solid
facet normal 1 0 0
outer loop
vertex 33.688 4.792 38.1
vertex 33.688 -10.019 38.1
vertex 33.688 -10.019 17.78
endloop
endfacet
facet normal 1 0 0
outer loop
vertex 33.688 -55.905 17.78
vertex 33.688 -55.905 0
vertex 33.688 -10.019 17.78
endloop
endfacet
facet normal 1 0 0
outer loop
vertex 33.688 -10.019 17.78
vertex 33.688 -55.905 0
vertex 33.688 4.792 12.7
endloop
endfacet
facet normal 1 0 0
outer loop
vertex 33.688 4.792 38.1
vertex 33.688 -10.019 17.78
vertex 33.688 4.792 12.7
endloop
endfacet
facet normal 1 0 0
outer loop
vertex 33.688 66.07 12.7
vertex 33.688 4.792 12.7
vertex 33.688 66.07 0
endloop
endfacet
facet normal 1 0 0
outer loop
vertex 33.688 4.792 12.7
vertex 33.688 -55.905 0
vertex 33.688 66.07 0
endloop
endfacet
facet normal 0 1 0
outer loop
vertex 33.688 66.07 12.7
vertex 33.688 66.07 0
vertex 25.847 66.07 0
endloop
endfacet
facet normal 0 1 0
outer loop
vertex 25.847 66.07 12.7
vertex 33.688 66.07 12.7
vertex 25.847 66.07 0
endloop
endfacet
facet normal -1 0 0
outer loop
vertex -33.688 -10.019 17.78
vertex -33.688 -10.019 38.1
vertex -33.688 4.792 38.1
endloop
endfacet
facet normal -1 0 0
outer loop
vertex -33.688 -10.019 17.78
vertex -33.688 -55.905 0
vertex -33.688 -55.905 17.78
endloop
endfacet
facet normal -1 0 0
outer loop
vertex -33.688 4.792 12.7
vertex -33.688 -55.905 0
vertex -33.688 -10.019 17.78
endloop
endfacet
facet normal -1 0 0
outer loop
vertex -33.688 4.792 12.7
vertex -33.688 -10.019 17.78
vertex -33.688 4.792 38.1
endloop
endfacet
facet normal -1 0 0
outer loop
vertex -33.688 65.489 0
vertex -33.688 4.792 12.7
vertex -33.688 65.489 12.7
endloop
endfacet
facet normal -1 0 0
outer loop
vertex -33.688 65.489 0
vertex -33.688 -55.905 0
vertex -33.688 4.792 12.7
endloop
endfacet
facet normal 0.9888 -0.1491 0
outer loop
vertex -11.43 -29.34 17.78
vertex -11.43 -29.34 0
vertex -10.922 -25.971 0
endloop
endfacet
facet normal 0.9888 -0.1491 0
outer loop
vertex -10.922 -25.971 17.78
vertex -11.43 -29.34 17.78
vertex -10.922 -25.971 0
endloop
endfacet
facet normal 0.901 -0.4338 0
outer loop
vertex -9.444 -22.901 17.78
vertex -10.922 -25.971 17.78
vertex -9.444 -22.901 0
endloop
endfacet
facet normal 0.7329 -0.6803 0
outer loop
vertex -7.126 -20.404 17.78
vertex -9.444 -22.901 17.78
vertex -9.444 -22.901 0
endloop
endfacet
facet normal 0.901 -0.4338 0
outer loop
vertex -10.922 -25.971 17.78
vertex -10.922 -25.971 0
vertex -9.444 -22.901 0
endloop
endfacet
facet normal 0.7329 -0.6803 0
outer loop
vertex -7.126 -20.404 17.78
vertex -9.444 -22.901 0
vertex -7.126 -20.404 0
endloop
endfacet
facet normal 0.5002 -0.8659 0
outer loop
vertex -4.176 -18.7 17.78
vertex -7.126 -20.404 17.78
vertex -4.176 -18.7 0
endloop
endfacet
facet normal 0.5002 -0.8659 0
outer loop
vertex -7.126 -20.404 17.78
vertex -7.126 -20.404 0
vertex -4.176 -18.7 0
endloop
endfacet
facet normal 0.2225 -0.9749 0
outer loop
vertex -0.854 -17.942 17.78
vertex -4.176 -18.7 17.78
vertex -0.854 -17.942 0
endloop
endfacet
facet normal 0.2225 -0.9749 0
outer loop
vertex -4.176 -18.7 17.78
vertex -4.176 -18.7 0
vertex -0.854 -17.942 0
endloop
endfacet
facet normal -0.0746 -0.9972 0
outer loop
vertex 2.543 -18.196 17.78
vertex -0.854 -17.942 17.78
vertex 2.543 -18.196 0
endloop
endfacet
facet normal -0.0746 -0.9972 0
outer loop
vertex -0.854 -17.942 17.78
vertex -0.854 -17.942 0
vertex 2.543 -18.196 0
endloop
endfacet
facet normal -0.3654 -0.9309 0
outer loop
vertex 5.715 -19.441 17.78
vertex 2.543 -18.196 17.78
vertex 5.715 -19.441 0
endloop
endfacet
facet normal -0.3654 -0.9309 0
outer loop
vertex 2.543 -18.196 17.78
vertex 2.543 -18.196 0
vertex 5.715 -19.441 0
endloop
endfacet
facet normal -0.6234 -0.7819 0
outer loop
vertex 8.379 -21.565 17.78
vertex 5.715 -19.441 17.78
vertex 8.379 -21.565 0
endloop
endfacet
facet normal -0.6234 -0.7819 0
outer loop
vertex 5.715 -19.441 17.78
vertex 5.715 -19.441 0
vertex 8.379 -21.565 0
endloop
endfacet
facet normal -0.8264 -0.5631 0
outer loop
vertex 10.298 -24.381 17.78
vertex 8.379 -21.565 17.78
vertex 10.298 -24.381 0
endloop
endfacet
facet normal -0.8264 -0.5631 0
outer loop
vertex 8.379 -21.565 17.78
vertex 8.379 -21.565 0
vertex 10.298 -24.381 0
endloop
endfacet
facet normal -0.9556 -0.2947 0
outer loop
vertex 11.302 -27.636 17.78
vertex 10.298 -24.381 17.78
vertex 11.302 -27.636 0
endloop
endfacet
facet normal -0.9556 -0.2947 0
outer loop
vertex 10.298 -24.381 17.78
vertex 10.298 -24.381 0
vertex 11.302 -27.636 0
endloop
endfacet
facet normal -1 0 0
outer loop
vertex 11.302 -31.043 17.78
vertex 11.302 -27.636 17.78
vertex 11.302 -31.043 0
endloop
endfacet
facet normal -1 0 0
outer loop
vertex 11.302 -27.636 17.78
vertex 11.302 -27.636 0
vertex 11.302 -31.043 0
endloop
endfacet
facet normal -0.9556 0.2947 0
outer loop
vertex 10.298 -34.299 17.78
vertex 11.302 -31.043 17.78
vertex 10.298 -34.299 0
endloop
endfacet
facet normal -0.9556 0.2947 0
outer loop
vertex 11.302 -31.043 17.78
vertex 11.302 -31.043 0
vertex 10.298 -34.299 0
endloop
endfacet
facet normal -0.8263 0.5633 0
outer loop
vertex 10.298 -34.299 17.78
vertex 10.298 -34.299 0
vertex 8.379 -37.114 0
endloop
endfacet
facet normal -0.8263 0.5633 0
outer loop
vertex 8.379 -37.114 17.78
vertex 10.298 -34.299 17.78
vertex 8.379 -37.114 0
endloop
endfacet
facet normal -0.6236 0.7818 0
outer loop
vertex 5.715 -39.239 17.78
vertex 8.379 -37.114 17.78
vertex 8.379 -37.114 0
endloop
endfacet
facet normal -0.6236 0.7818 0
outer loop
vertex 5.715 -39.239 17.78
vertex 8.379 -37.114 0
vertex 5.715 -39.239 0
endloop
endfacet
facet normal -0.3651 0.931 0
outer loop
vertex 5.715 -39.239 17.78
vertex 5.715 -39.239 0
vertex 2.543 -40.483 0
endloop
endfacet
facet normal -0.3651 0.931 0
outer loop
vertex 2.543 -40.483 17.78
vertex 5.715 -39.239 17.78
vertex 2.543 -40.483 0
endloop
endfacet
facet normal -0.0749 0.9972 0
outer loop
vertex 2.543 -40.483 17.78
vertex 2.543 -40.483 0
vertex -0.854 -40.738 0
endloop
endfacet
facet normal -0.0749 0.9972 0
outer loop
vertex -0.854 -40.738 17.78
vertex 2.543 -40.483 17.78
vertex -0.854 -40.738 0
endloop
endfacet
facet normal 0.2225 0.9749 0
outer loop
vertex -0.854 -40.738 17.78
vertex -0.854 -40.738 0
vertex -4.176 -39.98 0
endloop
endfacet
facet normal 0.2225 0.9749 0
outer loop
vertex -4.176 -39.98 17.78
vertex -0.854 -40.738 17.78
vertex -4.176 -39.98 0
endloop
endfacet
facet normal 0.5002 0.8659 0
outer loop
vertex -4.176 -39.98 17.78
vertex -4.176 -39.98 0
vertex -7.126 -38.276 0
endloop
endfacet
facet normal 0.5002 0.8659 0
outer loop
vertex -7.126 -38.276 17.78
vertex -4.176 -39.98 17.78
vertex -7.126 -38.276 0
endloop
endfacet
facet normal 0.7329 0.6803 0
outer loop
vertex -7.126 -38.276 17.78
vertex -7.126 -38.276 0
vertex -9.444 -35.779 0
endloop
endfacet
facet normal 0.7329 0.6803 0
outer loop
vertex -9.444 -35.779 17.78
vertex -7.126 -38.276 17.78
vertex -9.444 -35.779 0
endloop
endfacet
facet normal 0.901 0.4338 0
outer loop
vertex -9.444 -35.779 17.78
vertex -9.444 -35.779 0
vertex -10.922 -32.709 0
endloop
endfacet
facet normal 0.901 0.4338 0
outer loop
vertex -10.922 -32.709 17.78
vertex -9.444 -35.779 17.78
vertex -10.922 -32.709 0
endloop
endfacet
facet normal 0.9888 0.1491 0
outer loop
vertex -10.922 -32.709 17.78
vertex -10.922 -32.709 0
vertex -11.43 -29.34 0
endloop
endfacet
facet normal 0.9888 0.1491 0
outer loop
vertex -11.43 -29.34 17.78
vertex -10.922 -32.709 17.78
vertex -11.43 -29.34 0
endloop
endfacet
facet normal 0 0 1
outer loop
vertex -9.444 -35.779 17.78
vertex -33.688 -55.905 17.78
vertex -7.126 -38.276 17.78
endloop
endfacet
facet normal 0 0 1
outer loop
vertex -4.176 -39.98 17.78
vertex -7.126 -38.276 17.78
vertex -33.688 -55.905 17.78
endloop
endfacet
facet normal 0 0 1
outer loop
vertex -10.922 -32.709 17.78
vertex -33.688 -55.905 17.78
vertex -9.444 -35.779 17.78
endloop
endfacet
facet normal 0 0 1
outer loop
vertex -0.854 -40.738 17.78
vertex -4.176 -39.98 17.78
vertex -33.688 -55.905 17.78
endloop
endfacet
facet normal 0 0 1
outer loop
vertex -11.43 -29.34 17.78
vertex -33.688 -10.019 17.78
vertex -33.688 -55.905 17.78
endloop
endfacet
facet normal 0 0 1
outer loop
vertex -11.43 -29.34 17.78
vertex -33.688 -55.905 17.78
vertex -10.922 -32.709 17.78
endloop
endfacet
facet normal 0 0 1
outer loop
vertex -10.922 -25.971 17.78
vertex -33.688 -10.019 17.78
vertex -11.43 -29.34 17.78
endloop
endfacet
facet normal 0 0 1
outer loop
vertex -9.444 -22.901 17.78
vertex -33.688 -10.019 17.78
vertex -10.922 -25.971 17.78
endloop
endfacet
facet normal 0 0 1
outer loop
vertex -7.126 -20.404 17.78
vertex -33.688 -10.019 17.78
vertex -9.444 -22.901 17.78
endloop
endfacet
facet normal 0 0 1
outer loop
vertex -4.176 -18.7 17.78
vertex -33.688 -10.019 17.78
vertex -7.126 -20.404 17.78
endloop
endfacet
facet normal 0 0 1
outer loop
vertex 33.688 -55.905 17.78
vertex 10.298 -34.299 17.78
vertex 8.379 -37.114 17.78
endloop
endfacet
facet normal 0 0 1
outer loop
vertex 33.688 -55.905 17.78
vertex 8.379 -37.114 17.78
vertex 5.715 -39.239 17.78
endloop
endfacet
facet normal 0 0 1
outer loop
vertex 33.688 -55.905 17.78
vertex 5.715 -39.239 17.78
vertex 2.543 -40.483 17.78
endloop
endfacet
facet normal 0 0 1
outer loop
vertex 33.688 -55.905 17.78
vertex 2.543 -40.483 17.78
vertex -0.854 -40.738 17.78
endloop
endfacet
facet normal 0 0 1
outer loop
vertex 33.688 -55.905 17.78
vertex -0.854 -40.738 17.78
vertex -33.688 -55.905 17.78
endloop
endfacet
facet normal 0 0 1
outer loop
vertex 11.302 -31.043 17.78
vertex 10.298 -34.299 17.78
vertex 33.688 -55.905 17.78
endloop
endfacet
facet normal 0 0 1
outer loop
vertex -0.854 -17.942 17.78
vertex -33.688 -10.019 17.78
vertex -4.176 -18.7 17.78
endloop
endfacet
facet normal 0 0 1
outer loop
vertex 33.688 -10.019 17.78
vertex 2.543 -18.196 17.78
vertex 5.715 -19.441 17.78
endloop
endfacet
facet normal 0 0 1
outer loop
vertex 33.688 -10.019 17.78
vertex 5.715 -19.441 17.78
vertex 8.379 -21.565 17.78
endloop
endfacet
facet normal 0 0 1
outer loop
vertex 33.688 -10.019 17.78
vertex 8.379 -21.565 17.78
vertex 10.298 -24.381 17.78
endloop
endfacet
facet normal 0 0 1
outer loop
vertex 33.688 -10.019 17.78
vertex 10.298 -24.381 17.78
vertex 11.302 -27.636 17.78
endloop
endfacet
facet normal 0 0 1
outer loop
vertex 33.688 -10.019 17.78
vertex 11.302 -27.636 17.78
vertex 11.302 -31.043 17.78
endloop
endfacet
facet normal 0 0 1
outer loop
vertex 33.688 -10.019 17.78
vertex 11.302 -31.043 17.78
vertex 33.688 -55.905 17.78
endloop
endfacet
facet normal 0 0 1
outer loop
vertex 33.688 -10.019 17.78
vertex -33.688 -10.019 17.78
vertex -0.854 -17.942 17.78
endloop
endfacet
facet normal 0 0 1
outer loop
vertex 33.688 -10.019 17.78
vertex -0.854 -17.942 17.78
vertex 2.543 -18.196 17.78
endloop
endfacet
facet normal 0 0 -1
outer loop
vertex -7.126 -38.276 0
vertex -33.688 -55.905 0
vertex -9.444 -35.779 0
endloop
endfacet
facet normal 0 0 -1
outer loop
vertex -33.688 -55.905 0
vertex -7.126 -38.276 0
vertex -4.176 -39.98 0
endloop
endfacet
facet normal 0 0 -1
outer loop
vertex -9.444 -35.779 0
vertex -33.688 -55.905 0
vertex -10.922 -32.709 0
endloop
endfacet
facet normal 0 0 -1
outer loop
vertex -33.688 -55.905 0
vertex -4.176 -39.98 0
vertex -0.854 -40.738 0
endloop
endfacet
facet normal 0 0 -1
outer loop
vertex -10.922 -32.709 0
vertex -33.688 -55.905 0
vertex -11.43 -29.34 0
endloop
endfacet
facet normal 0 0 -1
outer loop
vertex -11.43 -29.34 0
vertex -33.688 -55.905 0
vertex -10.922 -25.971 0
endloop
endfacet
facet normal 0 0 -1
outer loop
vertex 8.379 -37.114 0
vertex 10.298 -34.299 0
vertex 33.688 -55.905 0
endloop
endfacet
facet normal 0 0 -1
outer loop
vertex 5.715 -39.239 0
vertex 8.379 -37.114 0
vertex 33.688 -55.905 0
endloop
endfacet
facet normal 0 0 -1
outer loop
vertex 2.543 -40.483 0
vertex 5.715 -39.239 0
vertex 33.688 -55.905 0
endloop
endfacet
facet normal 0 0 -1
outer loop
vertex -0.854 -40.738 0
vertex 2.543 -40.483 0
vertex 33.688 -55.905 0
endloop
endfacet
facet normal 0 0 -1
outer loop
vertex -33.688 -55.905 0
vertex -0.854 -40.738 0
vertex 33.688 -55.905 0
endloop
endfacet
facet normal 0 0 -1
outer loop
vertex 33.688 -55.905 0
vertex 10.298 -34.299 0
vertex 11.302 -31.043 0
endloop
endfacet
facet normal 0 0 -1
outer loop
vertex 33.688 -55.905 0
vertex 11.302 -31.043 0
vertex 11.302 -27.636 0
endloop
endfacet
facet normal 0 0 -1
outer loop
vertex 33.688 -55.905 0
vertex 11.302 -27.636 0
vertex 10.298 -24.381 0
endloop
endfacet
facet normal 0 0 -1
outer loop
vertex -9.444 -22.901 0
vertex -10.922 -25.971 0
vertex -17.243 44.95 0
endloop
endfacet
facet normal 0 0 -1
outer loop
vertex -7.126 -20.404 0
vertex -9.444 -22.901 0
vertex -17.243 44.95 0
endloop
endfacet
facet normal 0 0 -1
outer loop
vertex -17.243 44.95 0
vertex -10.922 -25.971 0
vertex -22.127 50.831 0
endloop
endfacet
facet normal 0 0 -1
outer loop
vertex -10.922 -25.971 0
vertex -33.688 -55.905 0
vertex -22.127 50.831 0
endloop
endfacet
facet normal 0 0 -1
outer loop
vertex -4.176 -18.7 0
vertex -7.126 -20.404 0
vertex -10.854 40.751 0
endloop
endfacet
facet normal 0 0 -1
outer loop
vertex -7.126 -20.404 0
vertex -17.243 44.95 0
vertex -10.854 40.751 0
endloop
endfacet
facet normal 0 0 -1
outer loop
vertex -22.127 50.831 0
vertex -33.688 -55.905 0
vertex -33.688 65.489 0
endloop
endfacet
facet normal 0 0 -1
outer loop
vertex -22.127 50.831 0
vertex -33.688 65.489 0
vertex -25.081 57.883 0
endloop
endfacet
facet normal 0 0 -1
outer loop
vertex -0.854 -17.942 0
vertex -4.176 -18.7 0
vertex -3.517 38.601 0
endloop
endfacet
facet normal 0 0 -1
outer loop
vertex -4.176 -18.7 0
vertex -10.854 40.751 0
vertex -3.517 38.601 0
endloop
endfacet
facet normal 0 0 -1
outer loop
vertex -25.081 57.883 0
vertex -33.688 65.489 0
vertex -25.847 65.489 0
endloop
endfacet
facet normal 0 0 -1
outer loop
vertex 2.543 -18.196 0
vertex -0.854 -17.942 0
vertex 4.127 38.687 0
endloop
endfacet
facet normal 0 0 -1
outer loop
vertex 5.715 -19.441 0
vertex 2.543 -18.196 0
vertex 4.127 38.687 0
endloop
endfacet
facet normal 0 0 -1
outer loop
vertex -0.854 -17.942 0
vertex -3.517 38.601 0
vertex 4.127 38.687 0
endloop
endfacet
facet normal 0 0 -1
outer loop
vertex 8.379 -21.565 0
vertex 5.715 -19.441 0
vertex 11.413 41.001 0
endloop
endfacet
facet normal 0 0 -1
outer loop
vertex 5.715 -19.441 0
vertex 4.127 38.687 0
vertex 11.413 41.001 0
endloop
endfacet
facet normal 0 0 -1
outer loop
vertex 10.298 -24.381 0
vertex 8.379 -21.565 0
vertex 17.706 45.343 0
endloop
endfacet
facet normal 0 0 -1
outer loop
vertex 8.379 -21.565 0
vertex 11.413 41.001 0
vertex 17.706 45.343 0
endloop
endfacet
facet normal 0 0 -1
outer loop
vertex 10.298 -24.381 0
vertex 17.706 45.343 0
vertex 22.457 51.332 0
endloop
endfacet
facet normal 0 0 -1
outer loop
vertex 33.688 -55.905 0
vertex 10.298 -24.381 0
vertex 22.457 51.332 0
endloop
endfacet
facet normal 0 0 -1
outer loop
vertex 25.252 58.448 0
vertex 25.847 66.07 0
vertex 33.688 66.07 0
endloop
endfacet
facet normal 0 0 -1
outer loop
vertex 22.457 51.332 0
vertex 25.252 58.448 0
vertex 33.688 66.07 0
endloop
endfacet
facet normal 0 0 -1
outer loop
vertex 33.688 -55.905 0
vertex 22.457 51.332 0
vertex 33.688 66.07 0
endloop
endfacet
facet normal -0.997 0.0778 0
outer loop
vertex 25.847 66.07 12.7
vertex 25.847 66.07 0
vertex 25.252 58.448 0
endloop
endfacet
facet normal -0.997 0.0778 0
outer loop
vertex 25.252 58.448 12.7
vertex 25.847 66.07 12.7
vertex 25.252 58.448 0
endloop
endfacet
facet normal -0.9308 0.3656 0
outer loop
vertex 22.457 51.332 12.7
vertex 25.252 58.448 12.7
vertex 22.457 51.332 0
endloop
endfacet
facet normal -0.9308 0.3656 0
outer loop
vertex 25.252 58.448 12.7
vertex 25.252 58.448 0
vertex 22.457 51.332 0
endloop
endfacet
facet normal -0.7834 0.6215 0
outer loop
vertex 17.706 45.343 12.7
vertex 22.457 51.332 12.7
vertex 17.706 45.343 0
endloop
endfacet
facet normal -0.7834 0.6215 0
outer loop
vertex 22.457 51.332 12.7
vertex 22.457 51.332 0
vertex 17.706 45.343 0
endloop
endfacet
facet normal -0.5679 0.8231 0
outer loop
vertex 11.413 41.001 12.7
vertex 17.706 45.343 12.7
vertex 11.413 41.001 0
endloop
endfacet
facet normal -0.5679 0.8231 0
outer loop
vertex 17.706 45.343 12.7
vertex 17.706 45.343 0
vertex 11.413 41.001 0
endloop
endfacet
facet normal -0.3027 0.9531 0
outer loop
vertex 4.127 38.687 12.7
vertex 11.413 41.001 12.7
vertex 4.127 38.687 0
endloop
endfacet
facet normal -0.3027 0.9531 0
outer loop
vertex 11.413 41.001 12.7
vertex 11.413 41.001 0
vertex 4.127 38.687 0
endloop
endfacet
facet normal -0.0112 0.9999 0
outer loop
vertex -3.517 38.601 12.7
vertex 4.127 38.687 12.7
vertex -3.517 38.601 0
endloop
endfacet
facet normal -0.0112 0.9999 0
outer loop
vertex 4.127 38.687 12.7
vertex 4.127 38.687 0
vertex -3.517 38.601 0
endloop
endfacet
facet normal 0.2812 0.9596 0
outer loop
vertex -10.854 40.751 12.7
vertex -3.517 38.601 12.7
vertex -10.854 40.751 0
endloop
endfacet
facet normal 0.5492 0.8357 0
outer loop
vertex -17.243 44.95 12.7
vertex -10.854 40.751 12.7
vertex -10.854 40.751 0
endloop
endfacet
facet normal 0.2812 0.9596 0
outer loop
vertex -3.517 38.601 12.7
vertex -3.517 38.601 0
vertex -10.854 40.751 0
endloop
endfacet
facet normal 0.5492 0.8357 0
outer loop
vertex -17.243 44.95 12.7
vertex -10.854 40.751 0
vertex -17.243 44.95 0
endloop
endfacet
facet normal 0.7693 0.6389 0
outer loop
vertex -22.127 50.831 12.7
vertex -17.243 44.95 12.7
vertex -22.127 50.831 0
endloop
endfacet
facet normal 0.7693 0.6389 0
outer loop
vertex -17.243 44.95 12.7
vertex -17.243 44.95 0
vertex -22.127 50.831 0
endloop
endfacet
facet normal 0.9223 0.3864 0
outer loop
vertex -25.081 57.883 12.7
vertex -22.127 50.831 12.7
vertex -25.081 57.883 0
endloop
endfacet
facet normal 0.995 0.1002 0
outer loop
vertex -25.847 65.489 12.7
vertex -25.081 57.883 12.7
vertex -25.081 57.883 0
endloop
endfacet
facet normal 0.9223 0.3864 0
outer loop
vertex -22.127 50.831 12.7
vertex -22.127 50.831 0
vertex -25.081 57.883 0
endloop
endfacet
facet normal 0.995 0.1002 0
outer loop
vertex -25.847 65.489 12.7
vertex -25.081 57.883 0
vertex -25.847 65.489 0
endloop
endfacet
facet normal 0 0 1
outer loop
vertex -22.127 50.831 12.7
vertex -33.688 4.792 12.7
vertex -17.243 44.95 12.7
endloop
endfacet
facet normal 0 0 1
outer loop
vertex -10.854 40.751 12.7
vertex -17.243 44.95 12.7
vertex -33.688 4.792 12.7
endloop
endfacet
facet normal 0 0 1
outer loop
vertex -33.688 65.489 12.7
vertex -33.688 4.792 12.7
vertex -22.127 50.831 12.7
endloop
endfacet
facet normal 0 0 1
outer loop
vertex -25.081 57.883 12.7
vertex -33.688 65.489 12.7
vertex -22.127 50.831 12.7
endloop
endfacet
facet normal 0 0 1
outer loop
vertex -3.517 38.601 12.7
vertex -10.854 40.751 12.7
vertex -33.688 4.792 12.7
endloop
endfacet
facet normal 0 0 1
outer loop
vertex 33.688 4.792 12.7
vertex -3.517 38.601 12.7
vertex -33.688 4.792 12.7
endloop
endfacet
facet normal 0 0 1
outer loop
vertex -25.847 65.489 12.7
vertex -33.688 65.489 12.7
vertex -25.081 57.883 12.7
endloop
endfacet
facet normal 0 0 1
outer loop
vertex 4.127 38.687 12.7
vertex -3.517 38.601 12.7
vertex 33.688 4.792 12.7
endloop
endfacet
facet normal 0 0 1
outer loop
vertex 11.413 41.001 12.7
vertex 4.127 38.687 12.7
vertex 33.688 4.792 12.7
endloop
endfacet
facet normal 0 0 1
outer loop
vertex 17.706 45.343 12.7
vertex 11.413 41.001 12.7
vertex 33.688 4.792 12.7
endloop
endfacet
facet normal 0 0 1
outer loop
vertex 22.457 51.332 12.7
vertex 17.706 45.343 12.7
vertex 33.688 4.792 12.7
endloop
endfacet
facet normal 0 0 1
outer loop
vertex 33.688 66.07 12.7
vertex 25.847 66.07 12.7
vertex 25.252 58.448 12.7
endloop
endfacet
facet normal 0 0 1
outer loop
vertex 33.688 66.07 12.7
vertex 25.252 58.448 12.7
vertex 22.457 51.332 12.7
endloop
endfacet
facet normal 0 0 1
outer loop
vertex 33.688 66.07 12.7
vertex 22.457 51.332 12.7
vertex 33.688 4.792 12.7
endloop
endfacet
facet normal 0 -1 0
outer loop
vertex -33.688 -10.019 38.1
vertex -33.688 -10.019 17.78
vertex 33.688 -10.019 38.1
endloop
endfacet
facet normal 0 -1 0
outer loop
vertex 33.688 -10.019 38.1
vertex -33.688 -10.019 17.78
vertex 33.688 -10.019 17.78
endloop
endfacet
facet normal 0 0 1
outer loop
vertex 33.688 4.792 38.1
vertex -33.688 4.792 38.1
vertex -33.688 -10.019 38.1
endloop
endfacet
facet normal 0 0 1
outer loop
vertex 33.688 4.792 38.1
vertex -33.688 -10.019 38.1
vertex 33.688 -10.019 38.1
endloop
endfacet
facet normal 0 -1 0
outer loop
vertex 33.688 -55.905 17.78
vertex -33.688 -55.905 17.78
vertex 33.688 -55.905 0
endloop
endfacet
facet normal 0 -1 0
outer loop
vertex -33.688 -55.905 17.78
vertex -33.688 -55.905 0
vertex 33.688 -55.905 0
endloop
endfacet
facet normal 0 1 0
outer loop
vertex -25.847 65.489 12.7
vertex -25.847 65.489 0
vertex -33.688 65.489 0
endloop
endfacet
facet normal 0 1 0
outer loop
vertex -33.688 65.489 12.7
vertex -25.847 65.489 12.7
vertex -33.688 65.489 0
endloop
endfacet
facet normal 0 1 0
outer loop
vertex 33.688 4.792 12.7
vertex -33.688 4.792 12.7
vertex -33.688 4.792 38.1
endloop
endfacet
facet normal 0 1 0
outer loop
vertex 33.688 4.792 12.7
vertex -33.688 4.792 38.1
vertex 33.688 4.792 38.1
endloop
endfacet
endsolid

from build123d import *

# Parameters (mm, degrees)
F1_DEPTH = 12.7
F2_W     = 67.376848
F2_H     = 14.811288
F3_DEPTH = 25.4
F4_W     = 67.376848
F4_H     = 45.885952
F5_DEPTH = 5.08
F7_D     = 22.86


with BuildPart() as f1:
    # F0 (on Top) → F1 (new body)
    with BuildSketch(Plane.XY):
        with BuildLine():
            Line((-33.688422, 65.489128), (-33.688422, -55.905353))
            Line((-33.688422, -55.905353), (33.688426, -55.905353))
            Line((33.688426, -55.905353), (33.688426, 66.069968))
            Line((33.688426, 66.069968), (25.84715, 66.069968))
            ThreePointArc((25.84715, 66.069968), (0.308083, 38.360301), (-25.847152, 65.489128))
            Line((-25.847152, 65.489128), (-33.688422, 65.489128))
        make_face()
    extrude(amount=F1_DEPTH)

    # F2 (on face) → F3 (join)
    with BuildSketch(Plane.XY.offset(12.7)):
        with Locations((2e-06, -2.613757)):
            Rectangle(F2_W, F2_H)
    extrude(amount=F3_DEPTH)

    # F4 (on face) → F5 (join)
    with BuildSketch(Plane.XY.offset(12.7)):
        with Locations((2e-06, -32.962377)):
            Rectangle(F4_W, F4_H)
    extrude(amount=F5_DEPTH)

    # F7 (through all)
    with Locations(Plane.XY.offset(17.78)):
        with Locations((0, -29.339861)):
            Hole(F7_D / 2)


solid = f1.part
